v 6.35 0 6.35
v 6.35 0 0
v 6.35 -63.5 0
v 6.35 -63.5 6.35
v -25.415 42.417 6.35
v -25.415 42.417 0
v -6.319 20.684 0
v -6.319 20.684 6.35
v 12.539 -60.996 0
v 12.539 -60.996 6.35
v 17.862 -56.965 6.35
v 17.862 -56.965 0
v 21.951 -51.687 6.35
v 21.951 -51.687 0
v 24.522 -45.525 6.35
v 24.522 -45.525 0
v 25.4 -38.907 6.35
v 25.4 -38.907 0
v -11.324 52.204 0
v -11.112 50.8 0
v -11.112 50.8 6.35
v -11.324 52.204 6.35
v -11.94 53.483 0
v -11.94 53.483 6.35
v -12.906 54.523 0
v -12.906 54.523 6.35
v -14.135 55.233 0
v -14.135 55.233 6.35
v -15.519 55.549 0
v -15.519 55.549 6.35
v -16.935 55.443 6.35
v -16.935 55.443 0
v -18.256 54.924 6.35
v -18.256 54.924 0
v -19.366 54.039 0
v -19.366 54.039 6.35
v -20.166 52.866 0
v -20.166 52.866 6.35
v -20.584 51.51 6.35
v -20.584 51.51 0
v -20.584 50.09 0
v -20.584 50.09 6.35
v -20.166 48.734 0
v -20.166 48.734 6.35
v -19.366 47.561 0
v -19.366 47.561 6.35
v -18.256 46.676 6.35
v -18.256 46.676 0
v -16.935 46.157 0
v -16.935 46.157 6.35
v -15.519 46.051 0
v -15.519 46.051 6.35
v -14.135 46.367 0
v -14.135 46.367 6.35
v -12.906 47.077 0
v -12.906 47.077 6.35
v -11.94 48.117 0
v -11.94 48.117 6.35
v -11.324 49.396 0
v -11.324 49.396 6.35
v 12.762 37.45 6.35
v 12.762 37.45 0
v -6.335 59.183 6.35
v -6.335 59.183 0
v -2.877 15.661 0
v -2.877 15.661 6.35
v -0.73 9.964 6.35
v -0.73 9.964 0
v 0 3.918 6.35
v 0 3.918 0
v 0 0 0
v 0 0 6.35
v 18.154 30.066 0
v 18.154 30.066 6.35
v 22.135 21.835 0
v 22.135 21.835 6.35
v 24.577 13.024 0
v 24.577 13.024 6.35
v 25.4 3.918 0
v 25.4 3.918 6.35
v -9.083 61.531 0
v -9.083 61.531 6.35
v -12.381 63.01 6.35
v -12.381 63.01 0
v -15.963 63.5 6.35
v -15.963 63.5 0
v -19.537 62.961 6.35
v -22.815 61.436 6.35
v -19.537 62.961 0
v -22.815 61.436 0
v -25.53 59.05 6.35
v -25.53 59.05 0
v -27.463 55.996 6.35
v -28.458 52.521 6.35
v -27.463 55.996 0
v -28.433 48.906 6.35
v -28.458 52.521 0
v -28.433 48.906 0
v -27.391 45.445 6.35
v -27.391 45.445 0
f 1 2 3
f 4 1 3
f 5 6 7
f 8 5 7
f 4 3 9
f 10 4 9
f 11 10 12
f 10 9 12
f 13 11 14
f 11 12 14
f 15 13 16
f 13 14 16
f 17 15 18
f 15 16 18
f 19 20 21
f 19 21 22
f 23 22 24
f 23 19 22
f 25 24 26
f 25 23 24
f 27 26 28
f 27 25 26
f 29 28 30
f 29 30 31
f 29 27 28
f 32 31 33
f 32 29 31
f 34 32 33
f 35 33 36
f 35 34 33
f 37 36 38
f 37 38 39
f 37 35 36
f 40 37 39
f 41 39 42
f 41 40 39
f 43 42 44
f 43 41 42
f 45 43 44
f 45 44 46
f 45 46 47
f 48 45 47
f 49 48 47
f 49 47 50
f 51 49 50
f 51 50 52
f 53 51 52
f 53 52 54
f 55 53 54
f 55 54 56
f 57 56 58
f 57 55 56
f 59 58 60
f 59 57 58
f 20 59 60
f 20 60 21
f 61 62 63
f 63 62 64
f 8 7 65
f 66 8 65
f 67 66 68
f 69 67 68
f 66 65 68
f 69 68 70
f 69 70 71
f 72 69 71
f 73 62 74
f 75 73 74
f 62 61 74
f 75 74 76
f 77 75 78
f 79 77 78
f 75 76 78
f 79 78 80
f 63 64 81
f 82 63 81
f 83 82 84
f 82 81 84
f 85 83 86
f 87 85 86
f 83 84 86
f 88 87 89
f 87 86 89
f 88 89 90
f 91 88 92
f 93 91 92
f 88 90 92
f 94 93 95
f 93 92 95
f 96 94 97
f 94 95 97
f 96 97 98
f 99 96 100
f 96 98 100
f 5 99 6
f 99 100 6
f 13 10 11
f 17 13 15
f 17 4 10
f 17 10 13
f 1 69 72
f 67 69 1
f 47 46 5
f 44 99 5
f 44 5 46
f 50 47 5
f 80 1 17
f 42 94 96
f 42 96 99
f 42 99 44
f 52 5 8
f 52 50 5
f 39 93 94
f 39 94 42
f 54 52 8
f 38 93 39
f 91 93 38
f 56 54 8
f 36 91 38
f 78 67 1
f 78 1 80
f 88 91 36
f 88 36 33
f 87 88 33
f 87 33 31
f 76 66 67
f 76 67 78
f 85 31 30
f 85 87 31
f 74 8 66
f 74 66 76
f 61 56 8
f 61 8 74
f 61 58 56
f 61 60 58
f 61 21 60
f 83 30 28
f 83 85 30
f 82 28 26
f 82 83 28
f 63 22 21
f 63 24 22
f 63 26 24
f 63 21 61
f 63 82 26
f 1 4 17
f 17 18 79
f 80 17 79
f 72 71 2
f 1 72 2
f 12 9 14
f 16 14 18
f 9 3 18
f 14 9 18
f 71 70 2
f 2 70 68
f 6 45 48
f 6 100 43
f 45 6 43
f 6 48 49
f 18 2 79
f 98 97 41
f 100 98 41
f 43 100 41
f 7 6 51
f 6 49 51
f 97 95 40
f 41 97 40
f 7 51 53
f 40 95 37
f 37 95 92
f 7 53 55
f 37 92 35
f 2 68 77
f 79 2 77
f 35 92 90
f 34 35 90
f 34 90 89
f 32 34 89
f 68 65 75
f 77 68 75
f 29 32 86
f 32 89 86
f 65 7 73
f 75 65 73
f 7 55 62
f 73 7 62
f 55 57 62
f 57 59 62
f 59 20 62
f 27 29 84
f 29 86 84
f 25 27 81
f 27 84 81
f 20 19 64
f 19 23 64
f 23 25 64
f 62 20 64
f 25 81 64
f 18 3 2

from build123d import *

# Parameters (mm, degrees)
F0_R        = 4.7625
F1_DEPTH    = 6.35
F2_T1_DEPTH = 6.35
F2_T3_DEPTH = 129.3172212421
F3_R        = 50.8


# Not quite as in the source:
# - a fillet or chamfer that OpenCascade refuses, or shapes differently, is made with other operations: its cross-section is extruded or revolved along the edge and cut away or added


with BuildPart() as f1:
    # F0 (on Top) → F1 (new body)
    with BuildSketch(Plane.XY):
        with BuildLine():
            Line((25.4, -63.5), (25.4, 23.0659139254))
            Line((25.4, 23.0659139254), (-6.3346226919, 59.1827919466))
            ThreePointArc((-6.3346226919, 59.1827919466), (-24.2577919466, 60.3403773081), (-25.4153773081, 42.4172080534))
            Line((-25.4153773081, 42.4172080534), (0, 13.4922042489))
            Line((0, 13.4922042489), (0, 0))
            Line((0, 0), (6.35, 0))
            Line((6.35, 0), (6.35, -63.5))
            Line((6.35, -63.5), (25.4, -63.5))
        make_face()
        with Locations((-15.875, 50.8)):
            Circle(F0_R, mode=Mode.SUBTRACT)
    extrude(amount=F1_DEPTH)

    # F2: fillet of radius 25.4 on 2 edges, made by hand

    # F2_s2 → F2_t1 (join)
    with BuildSketch(Plane.XY):
        with BuildLine():
            ThreePointArc((-6.3192453838, 20.6840784656), (-1.6322574983, 12.8769775006), (0, 3.9184945725))
            Line((0, 3.9184945725), (0, 13.4922042489))
            Line((0, 13.4922042489), (-6.3192453838, 20.6840784656))
        make_face()
    extrude(amount=F2_T1_DEPTH)

    # F2_s4 → F2_t3 (cut)
    with BuildSketch(Plane.XY.offset(-61.483610621)):
        with BuildLine():
            ThreePointArc((6.35, -63.5), (20.0804631421, -54.4608156183), (25.4, -38.9065557516))
            Line((25.4, -38.9065557516), (25.4, -63.5))
            Line((25.4, -63.5), (6.35, -63.5))
        make_face()
    extrude(amount=F2_T3_DEPTH, mode=Mode.SUBTRACT)

    # F3
    f3_edges = [f1.edges().sort_by_distance(p)[0] for p in [
        (25.4, 23.065914, 3.175),
    ]]
    fillet(f3_edges, radius=F3_R)


solid = f1.part
